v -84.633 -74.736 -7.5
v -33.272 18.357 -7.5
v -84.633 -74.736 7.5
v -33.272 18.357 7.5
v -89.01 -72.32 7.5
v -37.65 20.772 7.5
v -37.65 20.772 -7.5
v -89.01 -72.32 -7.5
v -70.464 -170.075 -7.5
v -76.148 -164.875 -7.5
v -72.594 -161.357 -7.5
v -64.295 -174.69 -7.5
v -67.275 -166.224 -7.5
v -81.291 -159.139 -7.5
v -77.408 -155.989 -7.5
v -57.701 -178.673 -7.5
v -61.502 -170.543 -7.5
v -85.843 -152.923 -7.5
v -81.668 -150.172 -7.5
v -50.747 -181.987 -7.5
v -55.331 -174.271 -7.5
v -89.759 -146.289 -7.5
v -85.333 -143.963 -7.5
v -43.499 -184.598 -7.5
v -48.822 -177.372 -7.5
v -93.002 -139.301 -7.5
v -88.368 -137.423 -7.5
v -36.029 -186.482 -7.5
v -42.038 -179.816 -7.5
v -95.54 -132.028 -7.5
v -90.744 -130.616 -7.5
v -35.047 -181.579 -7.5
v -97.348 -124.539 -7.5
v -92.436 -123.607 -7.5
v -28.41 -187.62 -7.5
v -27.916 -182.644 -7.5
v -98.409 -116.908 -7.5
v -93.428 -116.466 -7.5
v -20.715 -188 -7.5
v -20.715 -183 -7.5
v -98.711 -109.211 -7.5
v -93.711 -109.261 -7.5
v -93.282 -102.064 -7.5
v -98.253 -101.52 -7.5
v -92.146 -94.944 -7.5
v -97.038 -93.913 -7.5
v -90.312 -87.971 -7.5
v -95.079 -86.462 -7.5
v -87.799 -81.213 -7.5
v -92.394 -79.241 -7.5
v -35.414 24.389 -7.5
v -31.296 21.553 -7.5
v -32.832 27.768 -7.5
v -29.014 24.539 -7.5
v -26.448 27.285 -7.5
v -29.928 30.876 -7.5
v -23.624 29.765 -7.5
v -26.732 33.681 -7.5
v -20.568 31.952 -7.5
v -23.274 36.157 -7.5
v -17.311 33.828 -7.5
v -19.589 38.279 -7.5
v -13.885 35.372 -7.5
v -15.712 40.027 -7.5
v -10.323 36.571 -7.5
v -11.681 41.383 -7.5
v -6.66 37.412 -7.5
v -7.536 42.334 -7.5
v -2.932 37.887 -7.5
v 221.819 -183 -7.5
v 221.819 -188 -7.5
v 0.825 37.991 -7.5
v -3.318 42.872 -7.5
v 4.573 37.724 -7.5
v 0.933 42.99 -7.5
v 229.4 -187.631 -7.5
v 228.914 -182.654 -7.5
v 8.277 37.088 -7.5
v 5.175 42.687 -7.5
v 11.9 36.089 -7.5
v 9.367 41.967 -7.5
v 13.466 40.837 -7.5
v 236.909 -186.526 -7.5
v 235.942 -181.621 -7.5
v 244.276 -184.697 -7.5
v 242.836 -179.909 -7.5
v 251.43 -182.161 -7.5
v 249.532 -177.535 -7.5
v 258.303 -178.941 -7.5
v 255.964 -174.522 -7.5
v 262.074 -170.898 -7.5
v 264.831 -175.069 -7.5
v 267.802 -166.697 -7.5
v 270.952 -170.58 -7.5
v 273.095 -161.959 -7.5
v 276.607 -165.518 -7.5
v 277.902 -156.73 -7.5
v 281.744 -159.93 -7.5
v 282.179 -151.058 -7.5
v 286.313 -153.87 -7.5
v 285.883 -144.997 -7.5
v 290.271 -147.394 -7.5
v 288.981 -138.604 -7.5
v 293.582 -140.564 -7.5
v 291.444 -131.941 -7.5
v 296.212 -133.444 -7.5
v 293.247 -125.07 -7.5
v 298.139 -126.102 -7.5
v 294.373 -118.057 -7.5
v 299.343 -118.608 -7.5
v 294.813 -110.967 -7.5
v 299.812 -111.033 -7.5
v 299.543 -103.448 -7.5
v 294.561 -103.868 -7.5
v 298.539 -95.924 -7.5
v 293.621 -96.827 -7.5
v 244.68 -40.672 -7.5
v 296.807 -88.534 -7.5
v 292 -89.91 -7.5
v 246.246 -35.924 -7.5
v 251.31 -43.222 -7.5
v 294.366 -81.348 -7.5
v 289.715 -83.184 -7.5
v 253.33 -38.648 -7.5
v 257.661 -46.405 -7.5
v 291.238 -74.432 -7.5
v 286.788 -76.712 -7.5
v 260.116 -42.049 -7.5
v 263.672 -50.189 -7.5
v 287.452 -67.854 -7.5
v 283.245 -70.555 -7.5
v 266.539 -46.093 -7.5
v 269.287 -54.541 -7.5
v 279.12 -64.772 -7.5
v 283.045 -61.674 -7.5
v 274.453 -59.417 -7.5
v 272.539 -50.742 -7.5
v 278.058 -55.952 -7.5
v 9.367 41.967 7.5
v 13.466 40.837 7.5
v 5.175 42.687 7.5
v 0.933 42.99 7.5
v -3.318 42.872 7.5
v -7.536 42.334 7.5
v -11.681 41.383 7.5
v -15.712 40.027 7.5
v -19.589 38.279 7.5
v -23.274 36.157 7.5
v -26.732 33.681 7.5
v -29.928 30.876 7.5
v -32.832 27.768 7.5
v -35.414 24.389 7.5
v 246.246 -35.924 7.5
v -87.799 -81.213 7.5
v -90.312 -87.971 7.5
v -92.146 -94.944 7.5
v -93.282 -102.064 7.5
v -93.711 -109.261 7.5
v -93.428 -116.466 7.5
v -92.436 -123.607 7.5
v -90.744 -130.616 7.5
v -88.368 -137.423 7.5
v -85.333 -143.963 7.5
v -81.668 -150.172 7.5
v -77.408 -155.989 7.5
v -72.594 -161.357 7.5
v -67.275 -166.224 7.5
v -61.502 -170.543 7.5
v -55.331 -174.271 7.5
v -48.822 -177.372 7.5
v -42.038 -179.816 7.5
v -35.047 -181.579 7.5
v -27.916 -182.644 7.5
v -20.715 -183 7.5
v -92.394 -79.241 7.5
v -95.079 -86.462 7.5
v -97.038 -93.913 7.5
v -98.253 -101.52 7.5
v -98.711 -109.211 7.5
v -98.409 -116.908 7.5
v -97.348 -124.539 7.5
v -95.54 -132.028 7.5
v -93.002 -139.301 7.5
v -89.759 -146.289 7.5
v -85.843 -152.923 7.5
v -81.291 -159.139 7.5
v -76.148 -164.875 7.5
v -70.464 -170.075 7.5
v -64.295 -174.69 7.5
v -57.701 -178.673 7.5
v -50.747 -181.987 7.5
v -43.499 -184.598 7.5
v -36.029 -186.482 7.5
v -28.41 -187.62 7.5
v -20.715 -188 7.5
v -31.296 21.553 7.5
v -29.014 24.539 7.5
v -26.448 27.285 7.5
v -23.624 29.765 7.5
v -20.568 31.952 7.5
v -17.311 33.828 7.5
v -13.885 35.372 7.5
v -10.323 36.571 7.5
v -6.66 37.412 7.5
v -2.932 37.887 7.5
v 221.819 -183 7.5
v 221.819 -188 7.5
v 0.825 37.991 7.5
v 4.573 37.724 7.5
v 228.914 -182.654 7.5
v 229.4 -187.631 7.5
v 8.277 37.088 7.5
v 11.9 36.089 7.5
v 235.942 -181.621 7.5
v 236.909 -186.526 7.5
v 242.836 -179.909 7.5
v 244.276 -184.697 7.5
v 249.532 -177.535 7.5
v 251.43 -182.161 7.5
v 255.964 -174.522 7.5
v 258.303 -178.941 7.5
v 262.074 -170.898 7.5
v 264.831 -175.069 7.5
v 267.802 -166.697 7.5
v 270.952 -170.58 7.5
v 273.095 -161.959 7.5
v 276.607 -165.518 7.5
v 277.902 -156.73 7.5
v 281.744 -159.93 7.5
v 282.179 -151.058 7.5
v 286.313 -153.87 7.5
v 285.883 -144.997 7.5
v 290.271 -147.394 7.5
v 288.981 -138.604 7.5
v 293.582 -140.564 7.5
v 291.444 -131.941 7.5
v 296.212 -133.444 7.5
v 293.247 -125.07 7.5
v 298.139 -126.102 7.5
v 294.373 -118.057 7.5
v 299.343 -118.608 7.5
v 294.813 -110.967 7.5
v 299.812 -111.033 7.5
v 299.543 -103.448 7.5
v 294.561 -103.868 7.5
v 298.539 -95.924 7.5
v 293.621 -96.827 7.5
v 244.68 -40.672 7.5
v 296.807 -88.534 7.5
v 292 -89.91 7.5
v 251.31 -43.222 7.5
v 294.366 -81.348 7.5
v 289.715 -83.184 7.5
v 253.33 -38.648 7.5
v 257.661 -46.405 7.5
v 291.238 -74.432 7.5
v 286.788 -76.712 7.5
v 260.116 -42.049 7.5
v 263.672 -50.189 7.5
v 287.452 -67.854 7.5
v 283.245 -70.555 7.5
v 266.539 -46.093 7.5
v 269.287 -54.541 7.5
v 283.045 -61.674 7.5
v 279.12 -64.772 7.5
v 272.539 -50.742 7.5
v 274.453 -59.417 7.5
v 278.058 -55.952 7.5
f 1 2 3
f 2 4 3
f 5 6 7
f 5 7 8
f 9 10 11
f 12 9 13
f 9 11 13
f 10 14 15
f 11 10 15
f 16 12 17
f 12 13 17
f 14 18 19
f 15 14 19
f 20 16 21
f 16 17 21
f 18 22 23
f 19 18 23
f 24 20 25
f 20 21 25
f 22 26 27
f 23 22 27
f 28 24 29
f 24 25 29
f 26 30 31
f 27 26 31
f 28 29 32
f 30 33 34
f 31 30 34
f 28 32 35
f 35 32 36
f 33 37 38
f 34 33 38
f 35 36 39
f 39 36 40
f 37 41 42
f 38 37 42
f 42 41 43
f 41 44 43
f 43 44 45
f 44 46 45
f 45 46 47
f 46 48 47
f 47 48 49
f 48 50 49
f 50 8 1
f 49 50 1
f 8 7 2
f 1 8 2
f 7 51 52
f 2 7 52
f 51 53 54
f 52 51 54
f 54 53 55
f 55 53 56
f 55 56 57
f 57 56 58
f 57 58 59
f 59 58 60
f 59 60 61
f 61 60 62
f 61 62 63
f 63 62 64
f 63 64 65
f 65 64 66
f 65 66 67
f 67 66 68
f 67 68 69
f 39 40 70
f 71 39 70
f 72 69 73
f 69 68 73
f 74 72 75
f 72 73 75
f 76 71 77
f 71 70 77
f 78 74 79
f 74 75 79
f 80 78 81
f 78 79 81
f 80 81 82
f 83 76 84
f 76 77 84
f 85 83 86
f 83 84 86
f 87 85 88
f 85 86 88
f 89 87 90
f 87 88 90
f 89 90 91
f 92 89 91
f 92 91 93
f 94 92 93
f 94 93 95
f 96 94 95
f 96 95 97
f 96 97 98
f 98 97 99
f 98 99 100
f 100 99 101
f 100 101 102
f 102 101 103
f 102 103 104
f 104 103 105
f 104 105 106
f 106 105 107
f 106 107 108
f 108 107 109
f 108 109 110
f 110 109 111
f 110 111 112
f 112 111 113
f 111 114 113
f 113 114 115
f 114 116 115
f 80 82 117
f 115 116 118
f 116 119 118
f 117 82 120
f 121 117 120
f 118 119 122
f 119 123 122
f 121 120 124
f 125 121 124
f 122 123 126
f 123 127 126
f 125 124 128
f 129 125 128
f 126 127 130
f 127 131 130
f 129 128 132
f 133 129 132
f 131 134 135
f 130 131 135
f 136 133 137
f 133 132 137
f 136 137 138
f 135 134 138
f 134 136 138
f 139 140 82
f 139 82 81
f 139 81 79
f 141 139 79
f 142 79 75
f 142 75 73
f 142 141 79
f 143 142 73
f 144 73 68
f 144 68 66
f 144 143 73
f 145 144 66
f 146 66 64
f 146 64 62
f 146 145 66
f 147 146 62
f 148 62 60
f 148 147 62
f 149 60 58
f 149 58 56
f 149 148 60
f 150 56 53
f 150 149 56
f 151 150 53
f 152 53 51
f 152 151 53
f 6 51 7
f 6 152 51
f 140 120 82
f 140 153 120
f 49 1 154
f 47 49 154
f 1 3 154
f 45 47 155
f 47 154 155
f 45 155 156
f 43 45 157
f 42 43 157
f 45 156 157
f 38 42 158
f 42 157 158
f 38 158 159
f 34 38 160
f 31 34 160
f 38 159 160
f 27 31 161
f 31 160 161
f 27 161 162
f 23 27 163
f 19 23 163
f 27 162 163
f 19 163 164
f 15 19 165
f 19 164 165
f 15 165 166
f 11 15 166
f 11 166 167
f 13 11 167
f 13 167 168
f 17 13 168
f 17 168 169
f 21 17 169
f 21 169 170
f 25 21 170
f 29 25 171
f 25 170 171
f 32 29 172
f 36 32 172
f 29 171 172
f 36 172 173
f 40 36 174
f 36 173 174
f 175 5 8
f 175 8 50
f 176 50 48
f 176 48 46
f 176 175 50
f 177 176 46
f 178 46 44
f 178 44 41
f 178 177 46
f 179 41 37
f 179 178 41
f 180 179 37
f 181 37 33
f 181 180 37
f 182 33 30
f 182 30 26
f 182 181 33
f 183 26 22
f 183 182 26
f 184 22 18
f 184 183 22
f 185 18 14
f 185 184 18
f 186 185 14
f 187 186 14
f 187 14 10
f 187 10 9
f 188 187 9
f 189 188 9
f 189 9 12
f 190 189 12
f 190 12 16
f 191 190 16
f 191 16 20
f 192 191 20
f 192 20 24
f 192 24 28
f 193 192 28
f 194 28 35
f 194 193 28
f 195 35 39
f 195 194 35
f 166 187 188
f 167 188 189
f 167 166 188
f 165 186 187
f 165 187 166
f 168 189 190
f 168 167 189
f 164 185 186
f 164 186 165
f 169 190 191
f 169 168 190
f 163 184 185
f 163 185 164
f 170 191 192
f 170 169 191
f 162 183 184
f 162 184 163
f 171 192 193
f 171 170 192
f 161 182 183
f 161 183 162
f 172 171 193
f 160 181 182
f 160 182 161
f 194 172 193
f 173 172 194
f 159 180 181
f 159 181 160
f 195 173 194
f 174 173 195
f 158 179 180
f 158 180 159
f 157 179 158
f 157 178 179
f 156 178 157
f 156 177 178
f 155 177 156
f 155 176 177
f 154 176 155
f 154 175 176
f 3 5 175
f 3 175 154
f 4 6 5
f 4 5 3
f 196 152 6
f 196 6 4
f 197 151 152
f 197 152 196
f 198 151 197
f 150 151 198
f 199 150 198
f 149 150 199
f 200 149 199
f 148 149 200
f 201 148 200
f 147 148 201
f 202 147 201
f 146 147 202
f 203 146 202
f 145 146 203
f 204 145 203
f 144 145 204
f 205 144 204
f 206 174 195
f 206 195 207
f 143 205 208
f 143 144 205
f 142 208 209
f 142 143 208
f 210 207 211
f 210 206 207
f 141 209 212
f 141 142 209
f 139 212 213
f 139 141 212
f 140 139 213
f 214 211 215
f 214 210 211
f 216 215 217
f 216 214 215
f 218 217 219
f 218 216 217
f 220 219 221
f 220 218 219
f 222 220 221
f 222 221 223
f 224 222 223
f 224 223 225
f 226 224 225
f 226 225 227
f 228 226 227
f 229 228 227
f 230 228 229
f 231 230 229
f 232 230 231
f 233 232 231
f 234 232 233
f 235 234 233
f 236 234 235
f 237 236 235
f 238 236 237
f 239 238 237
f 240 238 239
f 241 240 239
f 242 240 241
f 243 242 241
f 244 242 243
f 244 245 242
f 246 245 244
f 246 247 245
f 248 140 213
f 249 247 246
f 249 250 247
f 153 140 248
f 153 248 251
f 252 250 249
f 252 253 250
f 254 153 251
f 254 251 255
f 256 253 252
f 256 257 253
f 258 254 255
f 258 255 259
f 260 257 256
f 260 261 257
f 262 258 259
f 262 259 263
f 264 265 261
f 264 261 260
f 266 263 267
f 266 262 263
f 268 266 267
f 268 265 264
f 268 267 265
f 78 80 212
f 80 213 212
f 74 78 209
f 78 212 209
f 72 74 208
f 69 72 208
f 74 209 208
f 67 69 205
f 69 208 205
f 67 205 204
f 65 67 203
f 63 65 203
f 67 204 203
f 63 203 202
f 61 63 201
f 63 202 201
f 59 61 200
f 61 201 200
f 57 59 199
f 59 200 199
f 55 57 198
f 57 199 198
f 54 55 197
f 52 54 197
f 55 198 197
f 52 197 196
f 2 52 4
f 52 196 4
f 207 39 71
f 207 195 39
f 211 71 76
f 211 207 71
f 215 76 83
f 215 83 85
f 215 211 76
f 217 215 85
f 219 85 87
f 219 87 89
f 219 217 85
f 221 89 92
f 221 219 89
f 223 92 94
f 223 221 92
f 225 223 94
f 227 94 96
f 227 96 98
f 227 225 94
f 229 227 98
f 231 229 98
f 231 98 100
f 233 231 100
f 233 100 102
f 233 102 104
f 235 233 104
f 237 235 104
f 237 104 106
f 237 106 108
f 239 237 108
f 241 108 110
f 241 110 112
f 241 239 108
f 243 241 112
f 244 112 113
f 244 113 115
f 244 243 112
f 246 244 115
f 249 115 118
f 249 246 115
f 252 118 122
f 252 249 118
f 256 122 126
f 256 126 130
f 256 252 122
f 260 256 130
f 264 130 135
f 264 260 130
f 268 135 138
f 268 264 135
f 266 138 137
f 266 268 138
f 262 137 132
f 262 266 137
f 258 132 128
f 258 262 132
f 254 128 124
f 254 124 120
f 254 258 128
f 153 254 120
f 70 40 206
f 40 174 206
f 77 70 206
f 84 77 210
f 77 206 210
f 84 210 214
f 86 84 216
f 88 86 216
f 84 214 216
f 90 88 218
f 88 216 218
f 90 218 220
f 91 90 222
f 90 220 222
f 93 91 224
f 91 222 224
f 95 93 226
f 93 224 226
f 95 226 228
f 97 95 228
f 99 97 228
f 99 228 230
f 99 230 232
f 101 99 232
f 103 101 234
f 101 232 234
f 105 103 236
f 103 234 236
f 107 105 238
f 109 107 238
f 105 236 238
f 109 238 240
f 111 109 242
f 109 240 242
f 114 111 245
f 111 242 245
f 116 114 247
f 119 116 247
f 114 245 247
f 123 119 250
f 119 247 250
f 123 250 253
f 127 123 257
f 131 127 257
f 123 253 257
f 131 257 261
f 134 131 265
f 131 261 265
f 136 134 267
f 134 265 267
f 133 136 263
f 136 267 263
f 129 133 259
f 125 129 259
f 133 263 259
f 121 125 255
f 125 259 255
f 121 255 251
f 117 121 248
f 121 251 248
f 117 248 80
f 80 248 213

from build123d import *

# Parameters (mm, degrees)
EXTRUDE_THIN1_DEPTH      = 7.5
EXTRUDE_THIN1_DEPTH_BACK = 7.5


with BuildPart() as part:
    # Sketch2 → Extrude-Thin1 (new, two sides)
    with BuildSketch(Plane.XY) as extrude_thin1_sk:
        with BuildLine():
            Line((246.24621437, -35.923587532), (13.466243252, 40.836996617))
            ThreePointArc((13.466243252, 40.836996617), (-15.71191081, 40.02668933), (-37.64999876, 20.772038739))
            Line((-37.64999876, 20.772038739), (-89.010467091, -72.320487869))
            ThreePointArc((-89.010467091, -72.320487869), (-87.882828318, -149.654747848), (-20.715120503, -188))
            Line((-20.715120503, -188), (221.819075448, -188))
            ThreePointArc((221.819075448, -188), (298.831932078, -122.370121817), (246.24621437, -35.923587532))
        make_face()
        with BuildLine():
            Line((244.680372131, -40.672075511), (11.900401013, 36.088508638))
            ThreePointArc((11.900401013, 36.088508638), (-13.884944436, 35.372423129), (-33.272091928, 18.356685397))
            Line((-33.272091928, 18.356685397), (-84.632560259, -74.735841211))
            ThreePointArc((-84.632560259, -74.735841211), (-83.577206022, -147.112776832), (-20.715120503, -183))
            Line((-20.715120503, -183), (221.819075448, -183))
            ThreePointArc((221.819075448, -183), (293.895210499, -121.57716529), (244.680372131, -40.672075511))
        make_face(mode=Mode.SUBTRACT)
    extrude(amount=EXTRUDE_THIN1_DEPTH)
    extrude(extrude_thin1_sk.sketch, amount=-EXTRUDE_THIN1_DEPTH_BACK)


solid = part.part
